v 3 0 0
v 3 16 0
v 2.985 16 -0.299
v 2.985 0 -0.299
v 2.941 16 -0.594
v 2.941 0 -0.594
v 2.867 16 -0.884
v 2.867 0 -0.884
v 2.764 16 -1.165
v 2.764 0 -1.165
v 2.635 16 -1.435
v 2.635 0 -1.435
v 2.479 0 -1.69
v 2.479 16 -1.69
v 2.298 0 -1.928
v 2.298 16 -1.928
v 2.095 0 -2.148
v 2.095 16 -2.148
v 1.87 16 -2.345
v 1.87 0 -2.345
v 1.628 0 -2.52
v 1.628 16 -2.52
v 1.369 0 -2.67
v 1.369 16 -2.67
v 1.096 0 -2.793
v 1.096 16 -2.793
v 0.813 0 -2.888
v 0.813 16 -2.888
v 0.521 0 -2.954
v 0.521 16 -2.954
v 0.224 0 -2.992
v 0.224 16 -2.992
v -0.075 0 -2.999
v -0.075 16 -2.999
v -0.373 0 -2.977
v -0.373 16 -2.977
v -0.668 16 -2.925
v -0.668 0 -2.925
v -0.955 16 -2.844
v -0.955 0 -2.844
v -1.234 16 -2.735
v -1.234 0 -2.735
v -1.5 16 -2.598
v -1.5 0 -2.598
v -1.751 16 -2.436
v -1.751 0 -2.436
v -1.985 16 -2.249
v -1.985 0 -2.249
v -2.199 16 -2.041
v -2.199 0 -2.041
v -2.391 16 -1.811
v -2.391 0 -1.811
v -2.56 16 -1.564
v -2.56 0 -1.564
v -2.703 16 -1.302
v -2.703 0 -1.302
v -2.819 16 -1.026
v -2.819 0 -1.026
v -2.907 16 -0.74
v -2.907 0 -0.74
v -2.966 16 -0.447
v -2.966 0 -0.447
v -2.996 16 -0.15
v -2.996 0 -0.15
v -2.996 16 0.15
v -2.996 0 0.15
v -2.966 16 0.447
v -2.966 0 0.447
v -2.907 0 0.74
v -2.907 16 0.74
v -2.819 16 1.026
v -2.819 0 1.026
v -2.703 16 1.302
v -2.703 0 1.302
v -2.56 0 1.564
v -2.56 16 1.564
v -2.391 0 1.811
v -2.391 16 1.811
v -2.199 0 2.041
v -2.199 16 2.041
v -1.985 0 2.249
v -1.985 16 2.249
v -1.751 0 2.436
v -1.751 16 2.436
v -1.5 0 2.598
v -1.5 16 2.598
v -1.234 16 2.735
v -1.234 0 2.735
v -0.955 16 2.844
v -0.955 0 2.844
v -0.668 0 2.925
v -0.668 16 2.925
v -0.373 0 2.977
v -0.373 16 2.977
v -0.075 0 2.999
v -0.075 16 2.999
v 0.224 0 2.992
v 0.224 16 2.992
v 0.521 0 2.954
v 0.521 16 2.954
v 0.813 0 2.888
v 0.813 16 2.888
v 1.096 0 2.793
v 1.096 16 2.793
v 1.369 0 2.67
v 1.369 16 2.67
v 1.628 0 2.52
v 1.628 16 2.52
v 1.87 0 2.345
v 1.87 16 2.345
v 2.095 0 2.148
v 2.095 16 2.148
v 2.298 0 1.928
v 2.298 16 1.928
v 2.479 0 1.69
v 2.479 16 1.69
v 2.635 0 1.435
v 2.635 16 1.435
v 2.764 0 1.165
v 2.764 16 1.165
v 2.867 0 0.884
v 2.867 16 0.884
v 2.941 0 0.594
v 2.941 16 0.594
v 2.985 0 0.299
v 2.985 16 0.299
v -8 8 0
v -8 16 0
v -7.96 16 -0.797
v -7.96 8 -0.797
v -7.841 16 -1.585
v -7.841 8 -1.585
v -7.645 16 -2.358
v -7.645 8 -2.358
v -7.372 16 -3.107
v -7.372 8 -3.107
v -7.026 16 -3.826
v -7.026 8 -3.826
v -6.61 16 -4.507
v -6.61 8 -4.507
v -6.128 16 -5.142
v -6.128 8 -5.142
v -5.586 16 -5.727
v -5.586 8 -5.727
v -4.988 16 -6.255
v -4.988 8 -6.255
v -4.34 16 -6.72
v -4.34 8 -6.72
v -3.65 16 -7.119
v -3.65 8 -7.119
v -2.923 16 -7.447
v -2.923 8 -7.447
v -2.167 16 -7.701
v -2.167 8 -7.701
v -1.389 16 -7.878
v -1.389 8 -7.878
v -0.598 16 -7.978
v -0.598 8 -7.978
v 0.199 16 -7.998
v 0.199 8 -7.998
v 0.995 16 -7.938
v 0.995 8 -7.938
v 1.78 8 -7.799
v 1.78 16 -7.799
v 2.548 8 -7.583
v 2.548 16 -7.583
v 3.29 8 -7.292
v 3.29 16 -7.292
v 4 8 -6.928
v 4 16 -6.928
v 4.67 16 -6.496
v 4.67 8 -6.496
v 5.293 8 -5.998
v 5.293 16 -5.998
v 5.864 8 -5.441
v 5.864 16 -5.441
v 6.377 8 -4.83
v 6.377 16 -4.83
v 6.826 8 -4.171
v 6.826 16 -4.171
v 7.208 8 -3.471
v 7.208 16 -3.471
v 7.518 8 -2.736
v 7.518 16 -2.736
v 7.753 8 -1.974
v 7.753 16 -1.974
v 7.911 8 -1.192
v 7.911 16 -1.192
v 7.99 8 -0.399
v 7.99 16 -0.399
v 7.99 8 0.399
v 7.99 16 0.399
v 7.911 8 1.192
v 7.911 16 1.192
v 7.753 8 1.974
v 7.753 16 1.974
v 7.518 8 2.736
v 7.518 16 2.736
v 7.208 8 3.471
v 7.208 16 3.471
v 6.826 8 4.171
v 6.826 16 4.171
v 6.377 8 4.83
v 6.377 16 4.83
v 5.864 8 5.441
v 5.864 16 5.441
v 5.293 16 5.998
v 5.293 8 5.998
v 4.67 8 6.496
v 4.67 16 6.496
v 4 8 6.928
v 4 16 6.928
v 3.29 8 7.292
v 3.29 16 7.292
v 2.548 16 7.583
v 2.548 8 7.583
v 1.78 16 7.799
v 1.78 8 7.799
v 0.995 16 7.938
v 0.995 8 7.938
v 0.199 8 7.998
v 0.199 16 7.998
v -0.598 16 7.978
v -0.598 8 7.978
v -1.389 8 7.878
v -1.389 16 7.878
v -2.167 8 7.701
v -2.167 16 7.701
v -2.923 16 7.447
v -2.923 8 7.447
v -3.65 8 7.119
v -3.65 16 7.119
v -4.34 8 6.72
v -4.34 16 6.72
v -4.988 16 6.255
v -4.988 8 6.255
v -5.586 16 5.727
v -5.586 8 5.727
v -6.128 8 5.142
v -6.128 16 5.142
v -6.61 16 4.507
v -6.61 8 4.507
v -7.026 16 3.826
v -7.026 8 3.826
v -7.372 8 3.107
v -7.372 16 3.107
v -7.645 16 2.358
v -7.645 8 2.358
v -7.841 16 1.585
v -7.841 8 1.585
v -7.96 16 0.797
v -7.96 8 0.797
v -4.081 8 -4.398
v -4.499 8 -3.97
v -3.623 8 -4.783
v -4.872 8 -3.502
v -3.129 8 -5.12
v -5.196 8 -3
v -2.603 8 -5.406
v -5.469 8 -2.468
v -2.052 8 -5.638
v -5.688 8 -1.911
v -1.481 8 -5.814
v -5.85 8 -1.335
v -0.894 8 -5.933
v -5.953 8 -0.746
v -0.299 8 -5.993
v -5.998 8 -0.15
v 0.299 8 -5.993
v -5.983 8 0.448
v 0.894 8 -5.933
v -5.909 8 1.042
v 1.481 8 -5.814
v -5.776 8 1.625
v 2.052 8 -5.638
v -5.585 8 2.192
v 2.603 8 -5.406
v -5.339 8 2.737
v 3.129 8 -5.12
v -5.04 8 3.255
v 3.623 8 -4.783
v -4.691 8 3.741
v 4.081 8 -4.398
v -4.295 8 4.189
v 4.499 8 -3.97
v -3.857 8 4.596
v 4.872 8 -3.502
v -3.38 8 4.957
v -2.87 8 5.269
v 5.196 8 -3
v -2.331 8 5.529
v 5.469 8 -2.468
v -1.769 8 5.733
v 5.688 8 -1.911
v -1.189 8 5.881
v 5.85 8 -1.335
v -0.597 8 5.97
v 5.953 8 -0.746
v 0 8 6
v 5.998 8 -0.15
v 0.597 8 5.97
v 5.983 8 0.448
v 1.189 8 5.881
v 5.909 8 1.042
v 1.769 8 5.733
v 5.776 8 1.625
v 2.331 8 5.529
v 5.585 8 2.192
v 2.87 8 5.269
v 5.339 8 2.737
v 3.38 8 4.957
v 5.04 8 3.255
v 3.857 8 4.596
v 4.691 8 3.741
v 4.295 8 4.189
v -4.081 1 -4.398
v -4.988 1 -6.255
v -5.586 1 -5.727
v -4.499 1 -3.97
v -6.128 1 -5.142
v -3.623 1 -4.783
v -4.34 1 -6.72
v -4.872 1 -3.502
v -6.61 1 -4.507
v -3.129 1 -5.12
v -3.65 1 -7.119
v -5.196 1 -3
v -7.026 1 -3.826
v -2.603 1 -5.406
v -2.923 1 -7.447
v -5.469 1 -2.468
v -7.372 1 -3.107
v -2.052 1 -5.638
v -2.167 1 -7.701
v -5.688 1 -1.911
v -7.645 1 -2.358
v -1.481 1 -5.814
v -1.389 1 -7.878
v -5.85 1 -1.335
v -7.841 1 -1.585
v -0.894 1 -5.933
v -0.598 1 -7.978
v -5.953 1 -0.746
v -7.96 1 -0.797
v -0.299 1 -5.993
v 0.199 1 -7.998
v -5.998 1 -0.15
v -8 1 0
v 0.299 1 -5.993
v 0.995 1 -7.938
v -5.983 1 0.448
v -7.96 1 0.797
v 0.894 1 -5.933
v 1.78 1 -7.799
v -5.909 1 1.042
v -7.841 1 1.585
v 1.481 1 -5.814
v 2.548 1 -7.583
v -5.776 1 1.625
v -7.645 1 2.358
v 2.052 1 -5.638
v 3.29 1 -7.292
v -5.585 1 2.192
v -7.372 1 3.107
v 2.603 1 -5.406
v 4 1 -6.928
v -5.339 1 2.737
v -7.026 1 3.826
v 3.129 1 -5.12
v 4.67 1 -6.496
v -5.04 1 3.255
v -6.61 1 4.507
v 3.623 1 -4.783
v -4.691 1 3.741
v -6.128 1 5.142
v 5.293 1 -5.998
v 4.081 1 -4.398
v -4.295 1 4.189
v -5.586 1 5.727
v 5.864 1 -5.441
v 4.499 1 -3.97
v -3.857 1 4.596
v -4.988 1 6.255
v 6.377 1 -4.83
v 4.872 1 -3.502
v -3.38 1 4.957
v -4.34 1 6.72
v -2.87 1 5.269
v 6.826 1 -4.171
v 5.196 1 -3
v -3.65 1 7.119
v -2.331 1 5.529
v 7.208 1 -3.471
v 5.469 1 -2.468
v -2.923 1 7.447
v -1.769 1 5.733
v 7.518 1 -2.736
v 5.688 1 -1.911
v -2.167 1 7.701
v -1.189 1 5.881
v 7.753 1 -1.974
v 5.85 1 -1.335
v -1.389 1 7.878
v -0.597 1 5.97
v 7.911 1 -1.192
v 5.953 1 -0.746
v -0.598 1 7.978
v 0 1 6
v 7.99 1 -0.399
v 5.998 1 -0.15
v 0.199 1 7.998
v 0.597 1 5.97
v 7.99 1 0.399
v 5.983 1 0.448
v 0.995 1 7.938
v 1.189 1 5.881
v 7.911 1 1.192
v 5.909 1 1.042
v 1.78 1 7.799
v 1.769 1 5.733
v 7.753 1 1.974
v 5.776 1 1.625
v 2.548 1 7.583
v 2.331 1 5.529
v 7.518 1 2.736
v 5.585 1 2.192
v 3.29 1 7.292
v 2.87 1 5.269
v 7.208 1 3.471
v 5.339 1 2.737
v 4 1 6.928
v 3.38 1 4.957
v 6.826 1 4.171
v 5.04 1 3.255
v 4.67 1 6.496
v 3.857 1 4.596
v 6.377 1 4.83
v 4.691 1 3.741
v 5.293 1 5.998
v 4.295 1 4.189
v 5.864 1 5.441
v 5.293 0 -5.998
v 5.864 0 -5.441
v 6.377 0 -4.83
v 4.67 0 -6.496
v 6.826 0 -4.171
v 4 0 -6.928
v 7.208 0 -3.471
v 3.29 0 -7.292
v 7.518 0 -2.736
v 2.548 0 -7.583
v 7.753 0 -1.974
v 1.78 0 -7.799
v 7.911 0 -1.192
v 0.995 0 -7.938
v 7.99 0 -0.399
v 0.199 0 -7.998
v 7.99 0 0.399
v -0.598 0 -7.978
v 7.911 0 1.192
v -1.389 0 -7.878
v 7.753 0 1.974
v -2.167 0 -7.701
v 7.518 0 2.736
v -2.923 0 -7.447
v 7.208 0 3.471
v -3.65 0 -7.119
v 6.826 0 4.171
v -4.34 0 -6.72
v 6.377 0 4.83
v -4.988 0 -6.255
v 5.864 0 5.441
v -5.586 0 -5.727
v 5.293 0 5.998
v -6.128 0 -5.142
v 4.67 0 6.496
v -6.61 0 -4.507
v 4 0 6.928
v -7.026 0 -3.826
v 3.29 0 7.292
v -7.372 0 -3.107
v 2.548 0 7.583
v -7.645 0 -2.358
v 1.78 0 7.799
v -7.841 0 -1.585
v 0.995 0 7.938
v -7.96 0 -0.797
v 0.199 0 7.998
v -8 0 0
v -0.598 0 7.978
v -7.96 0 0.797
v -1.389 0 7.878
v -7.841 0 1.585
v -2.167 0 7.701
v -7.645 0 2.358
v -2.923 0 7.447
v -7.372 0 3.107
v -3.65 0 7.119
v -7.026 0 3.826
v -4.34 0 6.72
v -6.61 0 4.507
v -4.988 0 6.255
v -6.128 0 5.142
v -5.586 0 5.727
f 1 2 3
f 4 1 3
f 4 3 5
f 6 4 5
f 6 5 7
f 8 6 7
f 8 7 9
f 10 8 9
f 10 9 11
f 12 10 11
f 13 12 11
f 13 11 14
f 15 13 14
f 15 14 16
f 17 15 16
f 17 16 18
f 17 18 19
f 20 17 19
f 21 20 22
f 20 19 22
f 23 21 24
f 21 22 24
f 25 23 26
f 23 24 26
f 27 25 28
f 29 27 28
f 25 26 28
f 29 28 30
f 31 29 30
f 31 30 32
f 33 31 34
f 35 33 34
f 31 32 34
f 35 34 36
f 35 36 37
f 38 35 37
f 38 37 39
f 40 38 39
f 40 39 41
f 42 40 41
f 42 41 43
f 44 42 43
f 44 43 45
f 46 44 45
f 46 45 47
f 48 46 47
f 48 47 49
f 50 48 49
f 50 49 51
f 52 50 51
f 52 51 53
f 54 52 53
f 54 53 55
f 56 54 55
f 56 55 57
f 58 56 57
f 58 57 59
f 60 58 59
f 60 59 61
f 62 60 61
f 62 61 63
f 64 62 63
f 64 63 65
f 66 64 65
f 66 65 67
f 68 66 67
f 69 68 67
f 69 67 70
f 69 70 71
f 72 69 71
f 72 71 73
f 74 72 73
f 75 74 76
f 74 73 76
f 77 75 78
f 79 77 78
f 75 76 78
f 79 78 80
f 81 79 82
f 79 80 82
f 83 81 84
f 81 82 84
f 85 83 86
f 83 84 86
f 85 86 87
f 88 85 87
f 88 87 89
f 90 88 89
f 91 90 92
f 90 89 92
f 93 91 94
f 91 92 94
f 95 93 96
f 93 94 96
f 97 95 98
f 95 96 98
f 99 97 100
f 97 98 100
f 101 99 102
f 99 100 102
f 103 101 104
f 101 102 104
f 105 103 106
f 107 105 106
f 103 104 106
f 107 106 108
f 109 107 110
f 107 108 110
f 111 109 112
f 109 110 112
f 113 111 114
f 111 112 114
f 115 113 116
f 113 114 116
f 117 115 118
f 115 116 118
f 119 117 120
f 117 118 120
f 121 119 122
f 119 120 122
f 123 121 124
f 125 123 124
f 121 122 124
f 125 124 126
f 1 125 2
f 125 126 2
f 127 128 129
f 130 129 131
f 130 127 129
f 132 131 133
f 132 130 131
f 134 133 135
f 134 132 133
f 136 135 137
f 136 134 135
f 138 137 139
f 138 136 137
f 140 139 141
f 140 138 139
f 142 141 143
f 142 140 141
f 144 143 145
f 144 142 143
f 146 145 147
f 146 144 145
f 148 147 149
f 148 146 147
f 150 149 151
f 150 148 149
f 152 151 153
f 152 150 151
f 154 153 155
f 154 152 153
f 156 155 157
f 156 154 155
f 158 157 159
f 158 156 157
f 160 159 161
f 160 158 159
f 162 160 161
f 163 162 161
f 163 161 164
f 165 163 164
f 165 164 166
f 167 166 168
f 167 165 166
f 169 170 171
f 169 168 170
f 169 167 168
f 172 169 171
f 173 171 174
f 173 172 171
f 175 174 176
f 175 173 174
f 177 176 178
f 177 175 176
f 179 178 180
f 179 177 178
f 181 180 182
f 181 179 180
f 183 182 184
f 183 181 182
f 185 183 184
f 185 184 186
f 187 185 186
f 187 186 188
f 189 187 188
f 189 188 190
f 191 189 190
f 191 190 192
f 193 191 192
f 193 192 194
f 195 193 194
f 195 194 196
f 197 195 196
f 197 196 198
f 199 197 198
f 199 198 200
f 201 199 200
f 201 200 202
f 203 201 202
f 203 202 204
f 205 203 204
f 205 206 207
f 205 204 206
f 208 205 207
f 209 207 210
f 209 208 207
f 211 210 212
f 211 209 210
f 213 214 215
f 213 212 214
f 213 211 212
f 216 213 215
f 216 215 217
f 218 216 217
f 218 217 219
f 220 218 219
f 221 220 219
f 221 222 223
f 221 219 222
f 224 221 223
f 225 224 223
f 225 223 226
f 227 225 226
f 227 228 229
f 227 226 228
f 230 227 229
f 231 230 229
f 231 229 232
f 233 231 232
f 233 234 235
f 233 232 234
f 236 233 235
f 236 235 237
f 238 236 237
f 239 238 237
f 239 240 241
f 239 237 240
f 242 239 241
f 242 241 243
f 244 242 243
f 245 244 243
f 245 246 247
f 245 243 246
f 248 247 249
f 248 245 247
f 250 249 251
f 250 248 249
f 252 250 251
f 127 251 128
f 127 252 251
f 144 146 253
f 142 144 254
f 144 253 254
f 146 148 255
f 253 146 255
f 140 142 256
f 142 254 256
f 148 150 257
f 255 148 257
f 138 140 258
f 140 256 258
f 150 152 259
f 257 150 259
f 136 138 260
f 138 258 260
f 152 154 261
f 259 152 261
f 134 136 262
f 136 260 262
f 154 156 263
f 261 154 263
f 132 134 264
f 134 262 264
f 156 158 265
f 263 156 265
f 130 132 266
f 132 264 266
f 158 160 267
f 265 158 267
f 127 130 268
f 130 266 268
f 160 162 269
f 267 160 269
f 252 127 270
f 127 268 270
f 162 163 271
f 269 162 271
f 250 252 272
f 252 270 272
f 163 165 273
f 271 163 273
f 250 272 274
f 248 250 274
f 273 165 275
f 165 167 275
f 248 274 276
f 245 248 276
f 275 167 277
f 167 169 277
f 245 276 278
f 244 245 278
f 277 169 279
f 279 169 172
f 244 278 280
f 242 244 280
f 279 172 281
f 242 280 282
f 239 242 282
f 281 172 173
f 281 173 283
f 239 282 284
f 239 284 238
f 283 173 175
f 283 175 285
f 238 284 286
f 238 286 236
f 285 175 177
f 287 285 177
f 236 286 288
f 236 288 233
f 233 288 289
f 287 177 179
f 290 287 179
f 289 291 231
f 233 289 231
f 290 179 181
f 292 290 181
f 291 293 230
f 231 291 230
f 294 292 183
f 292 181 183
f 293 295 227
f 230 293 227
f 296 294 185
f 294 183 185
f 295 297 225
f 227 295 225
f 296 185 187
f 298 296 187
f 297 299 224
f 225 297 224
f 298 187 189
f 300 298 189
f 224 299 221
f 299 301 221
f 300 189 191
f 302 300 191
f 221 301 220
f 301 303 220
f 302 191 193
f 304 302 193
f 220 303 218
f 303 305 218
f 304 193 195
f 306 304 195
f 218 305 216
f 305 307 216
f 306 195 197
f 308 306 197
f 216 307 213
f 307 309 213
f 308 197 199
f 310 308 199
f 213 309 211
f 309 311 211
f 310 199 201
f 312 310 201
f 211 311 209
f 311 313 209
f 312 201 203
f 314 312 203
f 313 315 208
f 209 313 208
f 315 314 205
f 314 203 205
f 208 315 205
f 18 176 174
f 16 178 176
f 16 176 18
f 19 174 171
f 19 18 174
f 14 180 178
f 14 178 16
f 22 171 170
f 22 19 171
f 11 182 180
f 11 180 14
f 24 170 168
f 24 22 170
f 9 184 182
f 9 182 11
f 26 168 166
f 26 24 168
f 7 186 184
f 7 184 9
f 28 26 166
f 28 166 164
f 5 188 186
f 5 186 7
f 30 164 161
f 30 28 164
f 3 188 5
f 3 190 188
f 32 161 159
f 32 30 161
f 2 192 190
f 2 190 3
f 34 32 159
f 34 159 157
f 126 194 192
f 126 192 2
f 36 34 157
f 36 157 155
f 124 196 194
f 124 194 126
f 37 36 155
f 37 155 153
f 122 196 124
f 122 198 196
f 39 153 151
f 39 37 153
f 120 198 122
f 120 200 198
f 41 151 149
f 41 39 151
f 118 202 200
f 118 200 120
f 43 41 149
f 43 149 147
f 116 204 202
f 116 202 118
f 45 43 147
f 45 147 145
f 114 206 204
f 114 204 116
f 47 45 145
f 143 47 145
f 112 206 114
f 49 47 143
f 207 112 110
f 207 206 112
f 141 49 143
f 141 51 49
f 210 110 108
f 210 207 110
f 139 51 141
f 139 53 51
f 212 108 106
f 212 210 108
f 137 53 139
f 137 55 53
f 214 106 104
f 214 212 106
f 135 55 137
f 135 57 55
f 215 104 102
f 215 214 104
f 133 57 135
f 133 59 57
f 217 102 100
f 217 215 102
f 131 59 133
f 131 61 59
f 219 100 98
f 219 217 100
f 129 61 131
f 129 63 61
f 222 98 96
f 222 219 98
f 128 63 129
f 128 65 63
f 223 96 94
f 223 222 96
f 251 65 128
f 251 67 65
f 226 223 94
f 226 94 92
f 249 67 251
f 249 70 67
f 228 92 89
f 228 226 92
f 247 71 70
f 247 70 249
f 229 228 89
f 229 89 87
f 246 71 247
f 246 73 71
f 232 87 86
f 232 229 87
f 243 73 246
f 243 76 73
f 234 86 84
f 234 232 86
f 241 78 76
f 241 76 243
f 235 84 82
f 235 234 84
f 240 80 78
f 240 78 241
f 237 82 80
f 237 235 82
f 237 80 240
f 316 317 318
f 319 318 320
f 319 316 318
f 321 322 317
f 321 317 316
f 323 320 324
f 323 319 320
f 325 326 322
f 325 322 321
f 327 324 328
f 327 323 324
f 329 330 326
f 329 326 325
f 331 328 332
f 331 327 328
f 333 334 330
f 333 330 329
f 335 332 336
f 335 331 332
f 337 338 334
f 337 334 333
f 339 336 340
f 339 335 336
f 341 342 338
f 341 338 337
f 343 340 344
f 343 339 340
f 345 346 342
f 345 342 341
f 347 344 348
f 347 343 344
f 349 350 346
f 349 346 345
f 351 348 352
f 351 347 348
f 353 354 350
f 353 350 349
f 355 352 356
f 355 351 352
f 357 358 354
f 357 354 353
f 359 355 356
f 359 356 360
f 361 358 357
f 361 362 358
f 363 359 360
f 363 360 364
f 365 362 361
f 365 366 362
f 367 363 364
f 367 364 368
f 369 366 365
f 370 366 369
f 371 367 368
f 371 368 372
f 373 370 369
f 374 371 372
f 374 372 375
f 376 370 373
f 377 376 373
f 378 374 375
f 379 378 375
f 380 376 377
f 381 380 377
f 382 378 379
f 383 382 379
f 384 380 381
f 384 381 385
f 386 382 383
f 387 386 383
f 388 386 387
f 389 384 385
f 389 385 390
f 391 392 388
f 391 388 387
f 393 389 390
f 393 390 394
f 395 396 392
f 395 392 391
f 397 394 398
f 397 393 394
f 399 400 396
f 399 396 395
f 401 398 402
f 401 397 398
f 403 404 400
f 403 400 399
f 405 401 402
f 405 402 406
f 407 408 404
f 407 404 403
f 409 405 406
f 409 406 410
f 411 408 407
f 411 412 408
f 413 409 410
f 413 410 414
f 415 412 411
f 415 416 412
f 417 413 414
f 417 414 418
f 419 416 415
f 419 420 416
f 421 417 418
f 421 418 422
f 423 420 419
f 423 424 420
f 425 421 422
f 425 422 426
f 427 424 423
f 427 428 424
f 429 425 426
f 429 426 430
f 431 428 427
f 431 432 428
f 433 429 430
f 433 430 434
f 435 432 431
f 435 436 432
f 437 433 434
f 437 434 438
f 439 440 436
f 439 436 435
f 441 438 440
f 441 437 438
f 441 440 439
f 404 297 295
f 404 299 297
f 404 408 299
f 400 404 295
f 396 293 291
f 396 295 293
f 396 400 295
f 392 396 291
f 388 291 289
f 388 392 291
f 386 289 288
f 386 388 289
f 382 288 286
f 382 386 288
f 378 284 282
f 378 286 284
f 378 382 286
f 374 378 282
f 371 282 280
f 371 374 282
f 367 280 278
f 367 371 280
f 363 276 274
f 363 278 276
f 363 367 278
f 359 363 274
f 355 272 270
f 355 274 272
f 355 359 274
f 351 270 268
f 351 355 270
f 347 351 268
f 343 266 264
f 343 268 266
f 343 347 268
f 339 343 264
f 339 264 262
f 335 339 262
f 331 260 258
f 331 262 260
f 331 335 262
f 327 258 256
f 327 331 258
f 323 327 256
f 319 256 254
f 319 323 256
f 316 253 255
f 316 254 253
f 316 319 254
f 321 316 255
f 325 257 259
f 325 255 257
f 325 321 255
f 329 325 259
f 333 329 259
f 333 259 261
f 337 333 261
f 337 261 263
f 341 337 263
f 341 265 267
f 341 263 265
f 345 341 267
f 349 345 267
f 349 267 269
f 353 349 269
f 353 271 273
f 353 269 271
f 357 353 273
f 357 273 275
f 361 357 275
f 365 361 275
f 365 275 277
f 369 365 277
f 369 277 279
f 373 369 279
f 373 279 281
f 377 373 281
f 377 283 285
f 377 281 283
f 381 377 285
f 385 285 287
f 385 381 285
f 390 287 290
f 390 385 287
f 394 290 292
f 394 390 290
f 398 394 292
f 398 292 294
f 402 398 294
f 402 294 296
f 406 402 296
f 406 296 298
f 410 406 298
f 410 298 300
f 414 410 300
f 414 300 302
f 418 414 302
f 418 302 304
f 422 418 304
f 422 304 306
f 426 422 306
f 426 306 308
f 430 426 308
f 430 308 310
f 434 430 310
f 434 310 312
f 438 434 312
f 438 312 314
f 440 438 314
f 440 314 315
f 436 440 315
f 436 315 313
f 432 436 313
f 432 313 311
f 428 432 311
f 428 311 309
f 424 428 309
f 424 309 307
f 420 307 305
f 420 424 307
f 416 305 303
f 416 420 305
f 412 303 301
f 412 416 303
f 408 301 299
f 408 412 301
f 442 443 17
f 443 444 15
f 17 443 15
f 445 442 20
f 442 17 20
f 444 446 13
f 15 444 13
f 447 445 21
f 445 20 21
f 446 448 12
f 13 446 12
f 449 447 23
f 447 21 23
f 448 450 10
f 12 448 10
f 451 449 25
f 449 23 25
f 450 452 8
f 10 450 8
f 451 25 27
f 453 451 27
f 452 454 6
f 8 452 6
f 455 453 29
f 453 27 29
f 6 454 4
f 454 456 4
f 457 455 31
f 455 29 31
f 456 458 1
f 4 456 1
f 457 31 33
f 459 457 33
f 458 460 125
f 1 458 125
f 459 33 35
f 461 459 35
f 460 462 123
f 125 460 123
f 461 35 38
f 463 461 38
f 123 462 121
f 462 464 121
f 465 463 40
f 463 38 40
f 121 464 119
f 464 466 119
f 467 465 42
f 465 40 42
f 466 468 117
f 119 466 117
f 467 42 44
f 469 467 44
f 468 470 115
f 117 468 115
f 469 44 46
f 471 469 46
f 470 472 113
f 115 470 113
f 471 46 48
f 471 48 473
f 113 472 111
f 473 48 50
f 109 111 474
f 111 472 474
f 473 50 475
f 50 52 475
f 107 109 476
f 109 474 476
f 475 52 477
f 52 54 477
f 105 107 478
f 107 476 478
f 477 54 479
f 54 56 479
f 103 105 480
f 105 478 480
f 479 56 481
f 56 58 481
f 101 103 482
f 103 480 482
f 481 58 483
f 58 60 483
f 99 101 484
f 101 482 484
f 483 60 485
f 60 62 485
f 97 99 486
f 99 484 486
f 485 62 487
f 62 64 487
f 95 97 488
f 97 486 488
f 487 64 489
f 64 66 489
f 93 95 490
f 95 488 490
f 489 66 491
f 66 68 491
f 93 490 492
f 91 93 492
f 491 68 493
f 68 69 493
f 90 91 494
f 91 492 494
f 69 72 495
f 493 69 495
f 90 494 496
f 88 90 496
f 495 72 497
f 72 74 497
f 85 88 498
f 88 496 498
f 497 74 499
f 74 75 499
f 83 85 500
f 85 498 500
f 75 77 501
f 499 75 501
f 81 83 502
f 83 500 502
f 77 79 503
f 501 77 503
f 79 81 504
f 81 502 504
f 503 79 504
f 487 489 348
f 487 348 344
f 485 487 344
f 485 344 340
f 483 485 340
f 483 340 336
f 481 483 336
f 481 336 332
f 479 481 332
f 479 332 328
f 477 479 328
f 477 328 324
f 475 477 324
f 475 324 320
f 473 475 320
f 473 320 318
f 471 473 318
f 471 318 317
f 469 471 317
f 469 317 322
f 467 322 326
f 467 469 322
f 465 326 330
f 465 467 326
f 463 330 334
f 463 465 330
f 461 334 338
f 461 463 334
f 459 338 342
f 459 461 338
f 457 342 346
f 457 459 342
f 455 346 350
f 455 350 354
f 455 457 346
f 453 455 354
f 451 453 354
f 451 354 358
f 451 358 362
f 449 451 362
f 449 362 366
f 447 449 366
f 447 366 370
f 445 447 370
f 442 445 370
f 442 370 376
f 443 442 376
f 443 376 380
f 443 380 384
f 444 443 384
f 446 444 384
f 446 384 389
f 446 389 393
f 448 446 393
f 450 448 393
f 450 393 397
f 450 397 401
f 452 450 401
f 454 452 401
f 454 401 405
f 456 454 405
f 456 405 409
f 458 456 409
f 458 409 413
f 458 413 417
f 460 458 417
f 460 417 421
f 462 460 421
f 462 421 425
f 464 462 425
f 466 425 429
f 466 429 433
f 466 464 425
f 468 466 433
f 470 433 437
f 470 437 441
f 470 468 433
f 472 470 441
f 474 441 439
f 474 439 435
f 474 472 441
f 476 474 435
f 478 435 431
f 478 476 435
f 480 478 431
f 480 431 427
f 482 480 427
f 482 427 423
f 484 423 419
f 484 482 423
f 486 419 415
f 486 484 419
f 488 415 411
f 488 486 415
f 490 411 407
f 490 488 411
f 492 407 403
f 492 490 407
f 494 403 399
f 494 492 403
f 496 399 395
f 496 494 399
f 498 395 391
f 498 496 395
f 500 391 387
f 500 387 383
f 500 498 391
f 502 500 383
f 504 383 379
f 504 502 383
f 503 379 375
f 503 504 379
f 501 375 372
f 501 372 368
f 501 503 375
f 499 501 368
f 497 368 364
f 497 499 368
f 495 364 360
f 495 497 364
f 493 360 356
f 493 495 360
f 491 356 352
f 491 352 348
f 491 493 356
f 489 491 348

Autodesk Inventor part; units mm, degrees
ref_plane "YZ Plane" through (0, 0, 0) normal (1, 0, 0) x (0, 1, 0)
ref_plane "XZ Plane" through (0, 0, 0) normal (0, 1, 0) x (-1, 0, 0)
ref_plane "XY Plane" through (0, 0, 0) normal (0, 0, 1) x (1, 0, 0)
sketch "Boceto1" plane through (0, 0, 0) normal (0, 1, 0) x (-1, 0, 0)
  circle A0 centre (0, 0) radius 8
  dimension "d0" = 16
extrude "Extrusión1" add sketch "Boceto1" along normal blind 16
sketch "Boceto2" plane through (0, 16, 0) normal (0, 1, 0) x (1, 0, 0)
  circle A0 centre (0, 0) radius 3
  dimension "d3" = 6
extrude "Extrusión2" cut sketch "Boceto2" against normal blind 16
sketch "Boceto3" plane through (0, 0, 0) normal (1, 0, 0) x (0, 1, 0)
  line L0 (0, 8) -> (16, 8) projected
  line L1 (1, 8) -> (8, 8)
  line L2 (8, 8) -> (8, 6)
  line L3 (8, 6) -> (1, 6)
  line L4 (1, 6) -> (1, 8)
  line L5 (16, -8) -> (16, 8) projected
  line L6 (0, -8) -> (0, 8) projected
  line L7 (0, 0) -> (16, 0)
  dimension "d6" = 2
  dimension "d7" = 7
  dimension "d8" = 1
revolve "Revolución1" cut sketch "Boceto3" angle 360 about axis through (0, 0, 0) along (0, 1, 0) contours L0 L2 L3 L4
properties part number "20T pulley 6 mm bore GT2"
